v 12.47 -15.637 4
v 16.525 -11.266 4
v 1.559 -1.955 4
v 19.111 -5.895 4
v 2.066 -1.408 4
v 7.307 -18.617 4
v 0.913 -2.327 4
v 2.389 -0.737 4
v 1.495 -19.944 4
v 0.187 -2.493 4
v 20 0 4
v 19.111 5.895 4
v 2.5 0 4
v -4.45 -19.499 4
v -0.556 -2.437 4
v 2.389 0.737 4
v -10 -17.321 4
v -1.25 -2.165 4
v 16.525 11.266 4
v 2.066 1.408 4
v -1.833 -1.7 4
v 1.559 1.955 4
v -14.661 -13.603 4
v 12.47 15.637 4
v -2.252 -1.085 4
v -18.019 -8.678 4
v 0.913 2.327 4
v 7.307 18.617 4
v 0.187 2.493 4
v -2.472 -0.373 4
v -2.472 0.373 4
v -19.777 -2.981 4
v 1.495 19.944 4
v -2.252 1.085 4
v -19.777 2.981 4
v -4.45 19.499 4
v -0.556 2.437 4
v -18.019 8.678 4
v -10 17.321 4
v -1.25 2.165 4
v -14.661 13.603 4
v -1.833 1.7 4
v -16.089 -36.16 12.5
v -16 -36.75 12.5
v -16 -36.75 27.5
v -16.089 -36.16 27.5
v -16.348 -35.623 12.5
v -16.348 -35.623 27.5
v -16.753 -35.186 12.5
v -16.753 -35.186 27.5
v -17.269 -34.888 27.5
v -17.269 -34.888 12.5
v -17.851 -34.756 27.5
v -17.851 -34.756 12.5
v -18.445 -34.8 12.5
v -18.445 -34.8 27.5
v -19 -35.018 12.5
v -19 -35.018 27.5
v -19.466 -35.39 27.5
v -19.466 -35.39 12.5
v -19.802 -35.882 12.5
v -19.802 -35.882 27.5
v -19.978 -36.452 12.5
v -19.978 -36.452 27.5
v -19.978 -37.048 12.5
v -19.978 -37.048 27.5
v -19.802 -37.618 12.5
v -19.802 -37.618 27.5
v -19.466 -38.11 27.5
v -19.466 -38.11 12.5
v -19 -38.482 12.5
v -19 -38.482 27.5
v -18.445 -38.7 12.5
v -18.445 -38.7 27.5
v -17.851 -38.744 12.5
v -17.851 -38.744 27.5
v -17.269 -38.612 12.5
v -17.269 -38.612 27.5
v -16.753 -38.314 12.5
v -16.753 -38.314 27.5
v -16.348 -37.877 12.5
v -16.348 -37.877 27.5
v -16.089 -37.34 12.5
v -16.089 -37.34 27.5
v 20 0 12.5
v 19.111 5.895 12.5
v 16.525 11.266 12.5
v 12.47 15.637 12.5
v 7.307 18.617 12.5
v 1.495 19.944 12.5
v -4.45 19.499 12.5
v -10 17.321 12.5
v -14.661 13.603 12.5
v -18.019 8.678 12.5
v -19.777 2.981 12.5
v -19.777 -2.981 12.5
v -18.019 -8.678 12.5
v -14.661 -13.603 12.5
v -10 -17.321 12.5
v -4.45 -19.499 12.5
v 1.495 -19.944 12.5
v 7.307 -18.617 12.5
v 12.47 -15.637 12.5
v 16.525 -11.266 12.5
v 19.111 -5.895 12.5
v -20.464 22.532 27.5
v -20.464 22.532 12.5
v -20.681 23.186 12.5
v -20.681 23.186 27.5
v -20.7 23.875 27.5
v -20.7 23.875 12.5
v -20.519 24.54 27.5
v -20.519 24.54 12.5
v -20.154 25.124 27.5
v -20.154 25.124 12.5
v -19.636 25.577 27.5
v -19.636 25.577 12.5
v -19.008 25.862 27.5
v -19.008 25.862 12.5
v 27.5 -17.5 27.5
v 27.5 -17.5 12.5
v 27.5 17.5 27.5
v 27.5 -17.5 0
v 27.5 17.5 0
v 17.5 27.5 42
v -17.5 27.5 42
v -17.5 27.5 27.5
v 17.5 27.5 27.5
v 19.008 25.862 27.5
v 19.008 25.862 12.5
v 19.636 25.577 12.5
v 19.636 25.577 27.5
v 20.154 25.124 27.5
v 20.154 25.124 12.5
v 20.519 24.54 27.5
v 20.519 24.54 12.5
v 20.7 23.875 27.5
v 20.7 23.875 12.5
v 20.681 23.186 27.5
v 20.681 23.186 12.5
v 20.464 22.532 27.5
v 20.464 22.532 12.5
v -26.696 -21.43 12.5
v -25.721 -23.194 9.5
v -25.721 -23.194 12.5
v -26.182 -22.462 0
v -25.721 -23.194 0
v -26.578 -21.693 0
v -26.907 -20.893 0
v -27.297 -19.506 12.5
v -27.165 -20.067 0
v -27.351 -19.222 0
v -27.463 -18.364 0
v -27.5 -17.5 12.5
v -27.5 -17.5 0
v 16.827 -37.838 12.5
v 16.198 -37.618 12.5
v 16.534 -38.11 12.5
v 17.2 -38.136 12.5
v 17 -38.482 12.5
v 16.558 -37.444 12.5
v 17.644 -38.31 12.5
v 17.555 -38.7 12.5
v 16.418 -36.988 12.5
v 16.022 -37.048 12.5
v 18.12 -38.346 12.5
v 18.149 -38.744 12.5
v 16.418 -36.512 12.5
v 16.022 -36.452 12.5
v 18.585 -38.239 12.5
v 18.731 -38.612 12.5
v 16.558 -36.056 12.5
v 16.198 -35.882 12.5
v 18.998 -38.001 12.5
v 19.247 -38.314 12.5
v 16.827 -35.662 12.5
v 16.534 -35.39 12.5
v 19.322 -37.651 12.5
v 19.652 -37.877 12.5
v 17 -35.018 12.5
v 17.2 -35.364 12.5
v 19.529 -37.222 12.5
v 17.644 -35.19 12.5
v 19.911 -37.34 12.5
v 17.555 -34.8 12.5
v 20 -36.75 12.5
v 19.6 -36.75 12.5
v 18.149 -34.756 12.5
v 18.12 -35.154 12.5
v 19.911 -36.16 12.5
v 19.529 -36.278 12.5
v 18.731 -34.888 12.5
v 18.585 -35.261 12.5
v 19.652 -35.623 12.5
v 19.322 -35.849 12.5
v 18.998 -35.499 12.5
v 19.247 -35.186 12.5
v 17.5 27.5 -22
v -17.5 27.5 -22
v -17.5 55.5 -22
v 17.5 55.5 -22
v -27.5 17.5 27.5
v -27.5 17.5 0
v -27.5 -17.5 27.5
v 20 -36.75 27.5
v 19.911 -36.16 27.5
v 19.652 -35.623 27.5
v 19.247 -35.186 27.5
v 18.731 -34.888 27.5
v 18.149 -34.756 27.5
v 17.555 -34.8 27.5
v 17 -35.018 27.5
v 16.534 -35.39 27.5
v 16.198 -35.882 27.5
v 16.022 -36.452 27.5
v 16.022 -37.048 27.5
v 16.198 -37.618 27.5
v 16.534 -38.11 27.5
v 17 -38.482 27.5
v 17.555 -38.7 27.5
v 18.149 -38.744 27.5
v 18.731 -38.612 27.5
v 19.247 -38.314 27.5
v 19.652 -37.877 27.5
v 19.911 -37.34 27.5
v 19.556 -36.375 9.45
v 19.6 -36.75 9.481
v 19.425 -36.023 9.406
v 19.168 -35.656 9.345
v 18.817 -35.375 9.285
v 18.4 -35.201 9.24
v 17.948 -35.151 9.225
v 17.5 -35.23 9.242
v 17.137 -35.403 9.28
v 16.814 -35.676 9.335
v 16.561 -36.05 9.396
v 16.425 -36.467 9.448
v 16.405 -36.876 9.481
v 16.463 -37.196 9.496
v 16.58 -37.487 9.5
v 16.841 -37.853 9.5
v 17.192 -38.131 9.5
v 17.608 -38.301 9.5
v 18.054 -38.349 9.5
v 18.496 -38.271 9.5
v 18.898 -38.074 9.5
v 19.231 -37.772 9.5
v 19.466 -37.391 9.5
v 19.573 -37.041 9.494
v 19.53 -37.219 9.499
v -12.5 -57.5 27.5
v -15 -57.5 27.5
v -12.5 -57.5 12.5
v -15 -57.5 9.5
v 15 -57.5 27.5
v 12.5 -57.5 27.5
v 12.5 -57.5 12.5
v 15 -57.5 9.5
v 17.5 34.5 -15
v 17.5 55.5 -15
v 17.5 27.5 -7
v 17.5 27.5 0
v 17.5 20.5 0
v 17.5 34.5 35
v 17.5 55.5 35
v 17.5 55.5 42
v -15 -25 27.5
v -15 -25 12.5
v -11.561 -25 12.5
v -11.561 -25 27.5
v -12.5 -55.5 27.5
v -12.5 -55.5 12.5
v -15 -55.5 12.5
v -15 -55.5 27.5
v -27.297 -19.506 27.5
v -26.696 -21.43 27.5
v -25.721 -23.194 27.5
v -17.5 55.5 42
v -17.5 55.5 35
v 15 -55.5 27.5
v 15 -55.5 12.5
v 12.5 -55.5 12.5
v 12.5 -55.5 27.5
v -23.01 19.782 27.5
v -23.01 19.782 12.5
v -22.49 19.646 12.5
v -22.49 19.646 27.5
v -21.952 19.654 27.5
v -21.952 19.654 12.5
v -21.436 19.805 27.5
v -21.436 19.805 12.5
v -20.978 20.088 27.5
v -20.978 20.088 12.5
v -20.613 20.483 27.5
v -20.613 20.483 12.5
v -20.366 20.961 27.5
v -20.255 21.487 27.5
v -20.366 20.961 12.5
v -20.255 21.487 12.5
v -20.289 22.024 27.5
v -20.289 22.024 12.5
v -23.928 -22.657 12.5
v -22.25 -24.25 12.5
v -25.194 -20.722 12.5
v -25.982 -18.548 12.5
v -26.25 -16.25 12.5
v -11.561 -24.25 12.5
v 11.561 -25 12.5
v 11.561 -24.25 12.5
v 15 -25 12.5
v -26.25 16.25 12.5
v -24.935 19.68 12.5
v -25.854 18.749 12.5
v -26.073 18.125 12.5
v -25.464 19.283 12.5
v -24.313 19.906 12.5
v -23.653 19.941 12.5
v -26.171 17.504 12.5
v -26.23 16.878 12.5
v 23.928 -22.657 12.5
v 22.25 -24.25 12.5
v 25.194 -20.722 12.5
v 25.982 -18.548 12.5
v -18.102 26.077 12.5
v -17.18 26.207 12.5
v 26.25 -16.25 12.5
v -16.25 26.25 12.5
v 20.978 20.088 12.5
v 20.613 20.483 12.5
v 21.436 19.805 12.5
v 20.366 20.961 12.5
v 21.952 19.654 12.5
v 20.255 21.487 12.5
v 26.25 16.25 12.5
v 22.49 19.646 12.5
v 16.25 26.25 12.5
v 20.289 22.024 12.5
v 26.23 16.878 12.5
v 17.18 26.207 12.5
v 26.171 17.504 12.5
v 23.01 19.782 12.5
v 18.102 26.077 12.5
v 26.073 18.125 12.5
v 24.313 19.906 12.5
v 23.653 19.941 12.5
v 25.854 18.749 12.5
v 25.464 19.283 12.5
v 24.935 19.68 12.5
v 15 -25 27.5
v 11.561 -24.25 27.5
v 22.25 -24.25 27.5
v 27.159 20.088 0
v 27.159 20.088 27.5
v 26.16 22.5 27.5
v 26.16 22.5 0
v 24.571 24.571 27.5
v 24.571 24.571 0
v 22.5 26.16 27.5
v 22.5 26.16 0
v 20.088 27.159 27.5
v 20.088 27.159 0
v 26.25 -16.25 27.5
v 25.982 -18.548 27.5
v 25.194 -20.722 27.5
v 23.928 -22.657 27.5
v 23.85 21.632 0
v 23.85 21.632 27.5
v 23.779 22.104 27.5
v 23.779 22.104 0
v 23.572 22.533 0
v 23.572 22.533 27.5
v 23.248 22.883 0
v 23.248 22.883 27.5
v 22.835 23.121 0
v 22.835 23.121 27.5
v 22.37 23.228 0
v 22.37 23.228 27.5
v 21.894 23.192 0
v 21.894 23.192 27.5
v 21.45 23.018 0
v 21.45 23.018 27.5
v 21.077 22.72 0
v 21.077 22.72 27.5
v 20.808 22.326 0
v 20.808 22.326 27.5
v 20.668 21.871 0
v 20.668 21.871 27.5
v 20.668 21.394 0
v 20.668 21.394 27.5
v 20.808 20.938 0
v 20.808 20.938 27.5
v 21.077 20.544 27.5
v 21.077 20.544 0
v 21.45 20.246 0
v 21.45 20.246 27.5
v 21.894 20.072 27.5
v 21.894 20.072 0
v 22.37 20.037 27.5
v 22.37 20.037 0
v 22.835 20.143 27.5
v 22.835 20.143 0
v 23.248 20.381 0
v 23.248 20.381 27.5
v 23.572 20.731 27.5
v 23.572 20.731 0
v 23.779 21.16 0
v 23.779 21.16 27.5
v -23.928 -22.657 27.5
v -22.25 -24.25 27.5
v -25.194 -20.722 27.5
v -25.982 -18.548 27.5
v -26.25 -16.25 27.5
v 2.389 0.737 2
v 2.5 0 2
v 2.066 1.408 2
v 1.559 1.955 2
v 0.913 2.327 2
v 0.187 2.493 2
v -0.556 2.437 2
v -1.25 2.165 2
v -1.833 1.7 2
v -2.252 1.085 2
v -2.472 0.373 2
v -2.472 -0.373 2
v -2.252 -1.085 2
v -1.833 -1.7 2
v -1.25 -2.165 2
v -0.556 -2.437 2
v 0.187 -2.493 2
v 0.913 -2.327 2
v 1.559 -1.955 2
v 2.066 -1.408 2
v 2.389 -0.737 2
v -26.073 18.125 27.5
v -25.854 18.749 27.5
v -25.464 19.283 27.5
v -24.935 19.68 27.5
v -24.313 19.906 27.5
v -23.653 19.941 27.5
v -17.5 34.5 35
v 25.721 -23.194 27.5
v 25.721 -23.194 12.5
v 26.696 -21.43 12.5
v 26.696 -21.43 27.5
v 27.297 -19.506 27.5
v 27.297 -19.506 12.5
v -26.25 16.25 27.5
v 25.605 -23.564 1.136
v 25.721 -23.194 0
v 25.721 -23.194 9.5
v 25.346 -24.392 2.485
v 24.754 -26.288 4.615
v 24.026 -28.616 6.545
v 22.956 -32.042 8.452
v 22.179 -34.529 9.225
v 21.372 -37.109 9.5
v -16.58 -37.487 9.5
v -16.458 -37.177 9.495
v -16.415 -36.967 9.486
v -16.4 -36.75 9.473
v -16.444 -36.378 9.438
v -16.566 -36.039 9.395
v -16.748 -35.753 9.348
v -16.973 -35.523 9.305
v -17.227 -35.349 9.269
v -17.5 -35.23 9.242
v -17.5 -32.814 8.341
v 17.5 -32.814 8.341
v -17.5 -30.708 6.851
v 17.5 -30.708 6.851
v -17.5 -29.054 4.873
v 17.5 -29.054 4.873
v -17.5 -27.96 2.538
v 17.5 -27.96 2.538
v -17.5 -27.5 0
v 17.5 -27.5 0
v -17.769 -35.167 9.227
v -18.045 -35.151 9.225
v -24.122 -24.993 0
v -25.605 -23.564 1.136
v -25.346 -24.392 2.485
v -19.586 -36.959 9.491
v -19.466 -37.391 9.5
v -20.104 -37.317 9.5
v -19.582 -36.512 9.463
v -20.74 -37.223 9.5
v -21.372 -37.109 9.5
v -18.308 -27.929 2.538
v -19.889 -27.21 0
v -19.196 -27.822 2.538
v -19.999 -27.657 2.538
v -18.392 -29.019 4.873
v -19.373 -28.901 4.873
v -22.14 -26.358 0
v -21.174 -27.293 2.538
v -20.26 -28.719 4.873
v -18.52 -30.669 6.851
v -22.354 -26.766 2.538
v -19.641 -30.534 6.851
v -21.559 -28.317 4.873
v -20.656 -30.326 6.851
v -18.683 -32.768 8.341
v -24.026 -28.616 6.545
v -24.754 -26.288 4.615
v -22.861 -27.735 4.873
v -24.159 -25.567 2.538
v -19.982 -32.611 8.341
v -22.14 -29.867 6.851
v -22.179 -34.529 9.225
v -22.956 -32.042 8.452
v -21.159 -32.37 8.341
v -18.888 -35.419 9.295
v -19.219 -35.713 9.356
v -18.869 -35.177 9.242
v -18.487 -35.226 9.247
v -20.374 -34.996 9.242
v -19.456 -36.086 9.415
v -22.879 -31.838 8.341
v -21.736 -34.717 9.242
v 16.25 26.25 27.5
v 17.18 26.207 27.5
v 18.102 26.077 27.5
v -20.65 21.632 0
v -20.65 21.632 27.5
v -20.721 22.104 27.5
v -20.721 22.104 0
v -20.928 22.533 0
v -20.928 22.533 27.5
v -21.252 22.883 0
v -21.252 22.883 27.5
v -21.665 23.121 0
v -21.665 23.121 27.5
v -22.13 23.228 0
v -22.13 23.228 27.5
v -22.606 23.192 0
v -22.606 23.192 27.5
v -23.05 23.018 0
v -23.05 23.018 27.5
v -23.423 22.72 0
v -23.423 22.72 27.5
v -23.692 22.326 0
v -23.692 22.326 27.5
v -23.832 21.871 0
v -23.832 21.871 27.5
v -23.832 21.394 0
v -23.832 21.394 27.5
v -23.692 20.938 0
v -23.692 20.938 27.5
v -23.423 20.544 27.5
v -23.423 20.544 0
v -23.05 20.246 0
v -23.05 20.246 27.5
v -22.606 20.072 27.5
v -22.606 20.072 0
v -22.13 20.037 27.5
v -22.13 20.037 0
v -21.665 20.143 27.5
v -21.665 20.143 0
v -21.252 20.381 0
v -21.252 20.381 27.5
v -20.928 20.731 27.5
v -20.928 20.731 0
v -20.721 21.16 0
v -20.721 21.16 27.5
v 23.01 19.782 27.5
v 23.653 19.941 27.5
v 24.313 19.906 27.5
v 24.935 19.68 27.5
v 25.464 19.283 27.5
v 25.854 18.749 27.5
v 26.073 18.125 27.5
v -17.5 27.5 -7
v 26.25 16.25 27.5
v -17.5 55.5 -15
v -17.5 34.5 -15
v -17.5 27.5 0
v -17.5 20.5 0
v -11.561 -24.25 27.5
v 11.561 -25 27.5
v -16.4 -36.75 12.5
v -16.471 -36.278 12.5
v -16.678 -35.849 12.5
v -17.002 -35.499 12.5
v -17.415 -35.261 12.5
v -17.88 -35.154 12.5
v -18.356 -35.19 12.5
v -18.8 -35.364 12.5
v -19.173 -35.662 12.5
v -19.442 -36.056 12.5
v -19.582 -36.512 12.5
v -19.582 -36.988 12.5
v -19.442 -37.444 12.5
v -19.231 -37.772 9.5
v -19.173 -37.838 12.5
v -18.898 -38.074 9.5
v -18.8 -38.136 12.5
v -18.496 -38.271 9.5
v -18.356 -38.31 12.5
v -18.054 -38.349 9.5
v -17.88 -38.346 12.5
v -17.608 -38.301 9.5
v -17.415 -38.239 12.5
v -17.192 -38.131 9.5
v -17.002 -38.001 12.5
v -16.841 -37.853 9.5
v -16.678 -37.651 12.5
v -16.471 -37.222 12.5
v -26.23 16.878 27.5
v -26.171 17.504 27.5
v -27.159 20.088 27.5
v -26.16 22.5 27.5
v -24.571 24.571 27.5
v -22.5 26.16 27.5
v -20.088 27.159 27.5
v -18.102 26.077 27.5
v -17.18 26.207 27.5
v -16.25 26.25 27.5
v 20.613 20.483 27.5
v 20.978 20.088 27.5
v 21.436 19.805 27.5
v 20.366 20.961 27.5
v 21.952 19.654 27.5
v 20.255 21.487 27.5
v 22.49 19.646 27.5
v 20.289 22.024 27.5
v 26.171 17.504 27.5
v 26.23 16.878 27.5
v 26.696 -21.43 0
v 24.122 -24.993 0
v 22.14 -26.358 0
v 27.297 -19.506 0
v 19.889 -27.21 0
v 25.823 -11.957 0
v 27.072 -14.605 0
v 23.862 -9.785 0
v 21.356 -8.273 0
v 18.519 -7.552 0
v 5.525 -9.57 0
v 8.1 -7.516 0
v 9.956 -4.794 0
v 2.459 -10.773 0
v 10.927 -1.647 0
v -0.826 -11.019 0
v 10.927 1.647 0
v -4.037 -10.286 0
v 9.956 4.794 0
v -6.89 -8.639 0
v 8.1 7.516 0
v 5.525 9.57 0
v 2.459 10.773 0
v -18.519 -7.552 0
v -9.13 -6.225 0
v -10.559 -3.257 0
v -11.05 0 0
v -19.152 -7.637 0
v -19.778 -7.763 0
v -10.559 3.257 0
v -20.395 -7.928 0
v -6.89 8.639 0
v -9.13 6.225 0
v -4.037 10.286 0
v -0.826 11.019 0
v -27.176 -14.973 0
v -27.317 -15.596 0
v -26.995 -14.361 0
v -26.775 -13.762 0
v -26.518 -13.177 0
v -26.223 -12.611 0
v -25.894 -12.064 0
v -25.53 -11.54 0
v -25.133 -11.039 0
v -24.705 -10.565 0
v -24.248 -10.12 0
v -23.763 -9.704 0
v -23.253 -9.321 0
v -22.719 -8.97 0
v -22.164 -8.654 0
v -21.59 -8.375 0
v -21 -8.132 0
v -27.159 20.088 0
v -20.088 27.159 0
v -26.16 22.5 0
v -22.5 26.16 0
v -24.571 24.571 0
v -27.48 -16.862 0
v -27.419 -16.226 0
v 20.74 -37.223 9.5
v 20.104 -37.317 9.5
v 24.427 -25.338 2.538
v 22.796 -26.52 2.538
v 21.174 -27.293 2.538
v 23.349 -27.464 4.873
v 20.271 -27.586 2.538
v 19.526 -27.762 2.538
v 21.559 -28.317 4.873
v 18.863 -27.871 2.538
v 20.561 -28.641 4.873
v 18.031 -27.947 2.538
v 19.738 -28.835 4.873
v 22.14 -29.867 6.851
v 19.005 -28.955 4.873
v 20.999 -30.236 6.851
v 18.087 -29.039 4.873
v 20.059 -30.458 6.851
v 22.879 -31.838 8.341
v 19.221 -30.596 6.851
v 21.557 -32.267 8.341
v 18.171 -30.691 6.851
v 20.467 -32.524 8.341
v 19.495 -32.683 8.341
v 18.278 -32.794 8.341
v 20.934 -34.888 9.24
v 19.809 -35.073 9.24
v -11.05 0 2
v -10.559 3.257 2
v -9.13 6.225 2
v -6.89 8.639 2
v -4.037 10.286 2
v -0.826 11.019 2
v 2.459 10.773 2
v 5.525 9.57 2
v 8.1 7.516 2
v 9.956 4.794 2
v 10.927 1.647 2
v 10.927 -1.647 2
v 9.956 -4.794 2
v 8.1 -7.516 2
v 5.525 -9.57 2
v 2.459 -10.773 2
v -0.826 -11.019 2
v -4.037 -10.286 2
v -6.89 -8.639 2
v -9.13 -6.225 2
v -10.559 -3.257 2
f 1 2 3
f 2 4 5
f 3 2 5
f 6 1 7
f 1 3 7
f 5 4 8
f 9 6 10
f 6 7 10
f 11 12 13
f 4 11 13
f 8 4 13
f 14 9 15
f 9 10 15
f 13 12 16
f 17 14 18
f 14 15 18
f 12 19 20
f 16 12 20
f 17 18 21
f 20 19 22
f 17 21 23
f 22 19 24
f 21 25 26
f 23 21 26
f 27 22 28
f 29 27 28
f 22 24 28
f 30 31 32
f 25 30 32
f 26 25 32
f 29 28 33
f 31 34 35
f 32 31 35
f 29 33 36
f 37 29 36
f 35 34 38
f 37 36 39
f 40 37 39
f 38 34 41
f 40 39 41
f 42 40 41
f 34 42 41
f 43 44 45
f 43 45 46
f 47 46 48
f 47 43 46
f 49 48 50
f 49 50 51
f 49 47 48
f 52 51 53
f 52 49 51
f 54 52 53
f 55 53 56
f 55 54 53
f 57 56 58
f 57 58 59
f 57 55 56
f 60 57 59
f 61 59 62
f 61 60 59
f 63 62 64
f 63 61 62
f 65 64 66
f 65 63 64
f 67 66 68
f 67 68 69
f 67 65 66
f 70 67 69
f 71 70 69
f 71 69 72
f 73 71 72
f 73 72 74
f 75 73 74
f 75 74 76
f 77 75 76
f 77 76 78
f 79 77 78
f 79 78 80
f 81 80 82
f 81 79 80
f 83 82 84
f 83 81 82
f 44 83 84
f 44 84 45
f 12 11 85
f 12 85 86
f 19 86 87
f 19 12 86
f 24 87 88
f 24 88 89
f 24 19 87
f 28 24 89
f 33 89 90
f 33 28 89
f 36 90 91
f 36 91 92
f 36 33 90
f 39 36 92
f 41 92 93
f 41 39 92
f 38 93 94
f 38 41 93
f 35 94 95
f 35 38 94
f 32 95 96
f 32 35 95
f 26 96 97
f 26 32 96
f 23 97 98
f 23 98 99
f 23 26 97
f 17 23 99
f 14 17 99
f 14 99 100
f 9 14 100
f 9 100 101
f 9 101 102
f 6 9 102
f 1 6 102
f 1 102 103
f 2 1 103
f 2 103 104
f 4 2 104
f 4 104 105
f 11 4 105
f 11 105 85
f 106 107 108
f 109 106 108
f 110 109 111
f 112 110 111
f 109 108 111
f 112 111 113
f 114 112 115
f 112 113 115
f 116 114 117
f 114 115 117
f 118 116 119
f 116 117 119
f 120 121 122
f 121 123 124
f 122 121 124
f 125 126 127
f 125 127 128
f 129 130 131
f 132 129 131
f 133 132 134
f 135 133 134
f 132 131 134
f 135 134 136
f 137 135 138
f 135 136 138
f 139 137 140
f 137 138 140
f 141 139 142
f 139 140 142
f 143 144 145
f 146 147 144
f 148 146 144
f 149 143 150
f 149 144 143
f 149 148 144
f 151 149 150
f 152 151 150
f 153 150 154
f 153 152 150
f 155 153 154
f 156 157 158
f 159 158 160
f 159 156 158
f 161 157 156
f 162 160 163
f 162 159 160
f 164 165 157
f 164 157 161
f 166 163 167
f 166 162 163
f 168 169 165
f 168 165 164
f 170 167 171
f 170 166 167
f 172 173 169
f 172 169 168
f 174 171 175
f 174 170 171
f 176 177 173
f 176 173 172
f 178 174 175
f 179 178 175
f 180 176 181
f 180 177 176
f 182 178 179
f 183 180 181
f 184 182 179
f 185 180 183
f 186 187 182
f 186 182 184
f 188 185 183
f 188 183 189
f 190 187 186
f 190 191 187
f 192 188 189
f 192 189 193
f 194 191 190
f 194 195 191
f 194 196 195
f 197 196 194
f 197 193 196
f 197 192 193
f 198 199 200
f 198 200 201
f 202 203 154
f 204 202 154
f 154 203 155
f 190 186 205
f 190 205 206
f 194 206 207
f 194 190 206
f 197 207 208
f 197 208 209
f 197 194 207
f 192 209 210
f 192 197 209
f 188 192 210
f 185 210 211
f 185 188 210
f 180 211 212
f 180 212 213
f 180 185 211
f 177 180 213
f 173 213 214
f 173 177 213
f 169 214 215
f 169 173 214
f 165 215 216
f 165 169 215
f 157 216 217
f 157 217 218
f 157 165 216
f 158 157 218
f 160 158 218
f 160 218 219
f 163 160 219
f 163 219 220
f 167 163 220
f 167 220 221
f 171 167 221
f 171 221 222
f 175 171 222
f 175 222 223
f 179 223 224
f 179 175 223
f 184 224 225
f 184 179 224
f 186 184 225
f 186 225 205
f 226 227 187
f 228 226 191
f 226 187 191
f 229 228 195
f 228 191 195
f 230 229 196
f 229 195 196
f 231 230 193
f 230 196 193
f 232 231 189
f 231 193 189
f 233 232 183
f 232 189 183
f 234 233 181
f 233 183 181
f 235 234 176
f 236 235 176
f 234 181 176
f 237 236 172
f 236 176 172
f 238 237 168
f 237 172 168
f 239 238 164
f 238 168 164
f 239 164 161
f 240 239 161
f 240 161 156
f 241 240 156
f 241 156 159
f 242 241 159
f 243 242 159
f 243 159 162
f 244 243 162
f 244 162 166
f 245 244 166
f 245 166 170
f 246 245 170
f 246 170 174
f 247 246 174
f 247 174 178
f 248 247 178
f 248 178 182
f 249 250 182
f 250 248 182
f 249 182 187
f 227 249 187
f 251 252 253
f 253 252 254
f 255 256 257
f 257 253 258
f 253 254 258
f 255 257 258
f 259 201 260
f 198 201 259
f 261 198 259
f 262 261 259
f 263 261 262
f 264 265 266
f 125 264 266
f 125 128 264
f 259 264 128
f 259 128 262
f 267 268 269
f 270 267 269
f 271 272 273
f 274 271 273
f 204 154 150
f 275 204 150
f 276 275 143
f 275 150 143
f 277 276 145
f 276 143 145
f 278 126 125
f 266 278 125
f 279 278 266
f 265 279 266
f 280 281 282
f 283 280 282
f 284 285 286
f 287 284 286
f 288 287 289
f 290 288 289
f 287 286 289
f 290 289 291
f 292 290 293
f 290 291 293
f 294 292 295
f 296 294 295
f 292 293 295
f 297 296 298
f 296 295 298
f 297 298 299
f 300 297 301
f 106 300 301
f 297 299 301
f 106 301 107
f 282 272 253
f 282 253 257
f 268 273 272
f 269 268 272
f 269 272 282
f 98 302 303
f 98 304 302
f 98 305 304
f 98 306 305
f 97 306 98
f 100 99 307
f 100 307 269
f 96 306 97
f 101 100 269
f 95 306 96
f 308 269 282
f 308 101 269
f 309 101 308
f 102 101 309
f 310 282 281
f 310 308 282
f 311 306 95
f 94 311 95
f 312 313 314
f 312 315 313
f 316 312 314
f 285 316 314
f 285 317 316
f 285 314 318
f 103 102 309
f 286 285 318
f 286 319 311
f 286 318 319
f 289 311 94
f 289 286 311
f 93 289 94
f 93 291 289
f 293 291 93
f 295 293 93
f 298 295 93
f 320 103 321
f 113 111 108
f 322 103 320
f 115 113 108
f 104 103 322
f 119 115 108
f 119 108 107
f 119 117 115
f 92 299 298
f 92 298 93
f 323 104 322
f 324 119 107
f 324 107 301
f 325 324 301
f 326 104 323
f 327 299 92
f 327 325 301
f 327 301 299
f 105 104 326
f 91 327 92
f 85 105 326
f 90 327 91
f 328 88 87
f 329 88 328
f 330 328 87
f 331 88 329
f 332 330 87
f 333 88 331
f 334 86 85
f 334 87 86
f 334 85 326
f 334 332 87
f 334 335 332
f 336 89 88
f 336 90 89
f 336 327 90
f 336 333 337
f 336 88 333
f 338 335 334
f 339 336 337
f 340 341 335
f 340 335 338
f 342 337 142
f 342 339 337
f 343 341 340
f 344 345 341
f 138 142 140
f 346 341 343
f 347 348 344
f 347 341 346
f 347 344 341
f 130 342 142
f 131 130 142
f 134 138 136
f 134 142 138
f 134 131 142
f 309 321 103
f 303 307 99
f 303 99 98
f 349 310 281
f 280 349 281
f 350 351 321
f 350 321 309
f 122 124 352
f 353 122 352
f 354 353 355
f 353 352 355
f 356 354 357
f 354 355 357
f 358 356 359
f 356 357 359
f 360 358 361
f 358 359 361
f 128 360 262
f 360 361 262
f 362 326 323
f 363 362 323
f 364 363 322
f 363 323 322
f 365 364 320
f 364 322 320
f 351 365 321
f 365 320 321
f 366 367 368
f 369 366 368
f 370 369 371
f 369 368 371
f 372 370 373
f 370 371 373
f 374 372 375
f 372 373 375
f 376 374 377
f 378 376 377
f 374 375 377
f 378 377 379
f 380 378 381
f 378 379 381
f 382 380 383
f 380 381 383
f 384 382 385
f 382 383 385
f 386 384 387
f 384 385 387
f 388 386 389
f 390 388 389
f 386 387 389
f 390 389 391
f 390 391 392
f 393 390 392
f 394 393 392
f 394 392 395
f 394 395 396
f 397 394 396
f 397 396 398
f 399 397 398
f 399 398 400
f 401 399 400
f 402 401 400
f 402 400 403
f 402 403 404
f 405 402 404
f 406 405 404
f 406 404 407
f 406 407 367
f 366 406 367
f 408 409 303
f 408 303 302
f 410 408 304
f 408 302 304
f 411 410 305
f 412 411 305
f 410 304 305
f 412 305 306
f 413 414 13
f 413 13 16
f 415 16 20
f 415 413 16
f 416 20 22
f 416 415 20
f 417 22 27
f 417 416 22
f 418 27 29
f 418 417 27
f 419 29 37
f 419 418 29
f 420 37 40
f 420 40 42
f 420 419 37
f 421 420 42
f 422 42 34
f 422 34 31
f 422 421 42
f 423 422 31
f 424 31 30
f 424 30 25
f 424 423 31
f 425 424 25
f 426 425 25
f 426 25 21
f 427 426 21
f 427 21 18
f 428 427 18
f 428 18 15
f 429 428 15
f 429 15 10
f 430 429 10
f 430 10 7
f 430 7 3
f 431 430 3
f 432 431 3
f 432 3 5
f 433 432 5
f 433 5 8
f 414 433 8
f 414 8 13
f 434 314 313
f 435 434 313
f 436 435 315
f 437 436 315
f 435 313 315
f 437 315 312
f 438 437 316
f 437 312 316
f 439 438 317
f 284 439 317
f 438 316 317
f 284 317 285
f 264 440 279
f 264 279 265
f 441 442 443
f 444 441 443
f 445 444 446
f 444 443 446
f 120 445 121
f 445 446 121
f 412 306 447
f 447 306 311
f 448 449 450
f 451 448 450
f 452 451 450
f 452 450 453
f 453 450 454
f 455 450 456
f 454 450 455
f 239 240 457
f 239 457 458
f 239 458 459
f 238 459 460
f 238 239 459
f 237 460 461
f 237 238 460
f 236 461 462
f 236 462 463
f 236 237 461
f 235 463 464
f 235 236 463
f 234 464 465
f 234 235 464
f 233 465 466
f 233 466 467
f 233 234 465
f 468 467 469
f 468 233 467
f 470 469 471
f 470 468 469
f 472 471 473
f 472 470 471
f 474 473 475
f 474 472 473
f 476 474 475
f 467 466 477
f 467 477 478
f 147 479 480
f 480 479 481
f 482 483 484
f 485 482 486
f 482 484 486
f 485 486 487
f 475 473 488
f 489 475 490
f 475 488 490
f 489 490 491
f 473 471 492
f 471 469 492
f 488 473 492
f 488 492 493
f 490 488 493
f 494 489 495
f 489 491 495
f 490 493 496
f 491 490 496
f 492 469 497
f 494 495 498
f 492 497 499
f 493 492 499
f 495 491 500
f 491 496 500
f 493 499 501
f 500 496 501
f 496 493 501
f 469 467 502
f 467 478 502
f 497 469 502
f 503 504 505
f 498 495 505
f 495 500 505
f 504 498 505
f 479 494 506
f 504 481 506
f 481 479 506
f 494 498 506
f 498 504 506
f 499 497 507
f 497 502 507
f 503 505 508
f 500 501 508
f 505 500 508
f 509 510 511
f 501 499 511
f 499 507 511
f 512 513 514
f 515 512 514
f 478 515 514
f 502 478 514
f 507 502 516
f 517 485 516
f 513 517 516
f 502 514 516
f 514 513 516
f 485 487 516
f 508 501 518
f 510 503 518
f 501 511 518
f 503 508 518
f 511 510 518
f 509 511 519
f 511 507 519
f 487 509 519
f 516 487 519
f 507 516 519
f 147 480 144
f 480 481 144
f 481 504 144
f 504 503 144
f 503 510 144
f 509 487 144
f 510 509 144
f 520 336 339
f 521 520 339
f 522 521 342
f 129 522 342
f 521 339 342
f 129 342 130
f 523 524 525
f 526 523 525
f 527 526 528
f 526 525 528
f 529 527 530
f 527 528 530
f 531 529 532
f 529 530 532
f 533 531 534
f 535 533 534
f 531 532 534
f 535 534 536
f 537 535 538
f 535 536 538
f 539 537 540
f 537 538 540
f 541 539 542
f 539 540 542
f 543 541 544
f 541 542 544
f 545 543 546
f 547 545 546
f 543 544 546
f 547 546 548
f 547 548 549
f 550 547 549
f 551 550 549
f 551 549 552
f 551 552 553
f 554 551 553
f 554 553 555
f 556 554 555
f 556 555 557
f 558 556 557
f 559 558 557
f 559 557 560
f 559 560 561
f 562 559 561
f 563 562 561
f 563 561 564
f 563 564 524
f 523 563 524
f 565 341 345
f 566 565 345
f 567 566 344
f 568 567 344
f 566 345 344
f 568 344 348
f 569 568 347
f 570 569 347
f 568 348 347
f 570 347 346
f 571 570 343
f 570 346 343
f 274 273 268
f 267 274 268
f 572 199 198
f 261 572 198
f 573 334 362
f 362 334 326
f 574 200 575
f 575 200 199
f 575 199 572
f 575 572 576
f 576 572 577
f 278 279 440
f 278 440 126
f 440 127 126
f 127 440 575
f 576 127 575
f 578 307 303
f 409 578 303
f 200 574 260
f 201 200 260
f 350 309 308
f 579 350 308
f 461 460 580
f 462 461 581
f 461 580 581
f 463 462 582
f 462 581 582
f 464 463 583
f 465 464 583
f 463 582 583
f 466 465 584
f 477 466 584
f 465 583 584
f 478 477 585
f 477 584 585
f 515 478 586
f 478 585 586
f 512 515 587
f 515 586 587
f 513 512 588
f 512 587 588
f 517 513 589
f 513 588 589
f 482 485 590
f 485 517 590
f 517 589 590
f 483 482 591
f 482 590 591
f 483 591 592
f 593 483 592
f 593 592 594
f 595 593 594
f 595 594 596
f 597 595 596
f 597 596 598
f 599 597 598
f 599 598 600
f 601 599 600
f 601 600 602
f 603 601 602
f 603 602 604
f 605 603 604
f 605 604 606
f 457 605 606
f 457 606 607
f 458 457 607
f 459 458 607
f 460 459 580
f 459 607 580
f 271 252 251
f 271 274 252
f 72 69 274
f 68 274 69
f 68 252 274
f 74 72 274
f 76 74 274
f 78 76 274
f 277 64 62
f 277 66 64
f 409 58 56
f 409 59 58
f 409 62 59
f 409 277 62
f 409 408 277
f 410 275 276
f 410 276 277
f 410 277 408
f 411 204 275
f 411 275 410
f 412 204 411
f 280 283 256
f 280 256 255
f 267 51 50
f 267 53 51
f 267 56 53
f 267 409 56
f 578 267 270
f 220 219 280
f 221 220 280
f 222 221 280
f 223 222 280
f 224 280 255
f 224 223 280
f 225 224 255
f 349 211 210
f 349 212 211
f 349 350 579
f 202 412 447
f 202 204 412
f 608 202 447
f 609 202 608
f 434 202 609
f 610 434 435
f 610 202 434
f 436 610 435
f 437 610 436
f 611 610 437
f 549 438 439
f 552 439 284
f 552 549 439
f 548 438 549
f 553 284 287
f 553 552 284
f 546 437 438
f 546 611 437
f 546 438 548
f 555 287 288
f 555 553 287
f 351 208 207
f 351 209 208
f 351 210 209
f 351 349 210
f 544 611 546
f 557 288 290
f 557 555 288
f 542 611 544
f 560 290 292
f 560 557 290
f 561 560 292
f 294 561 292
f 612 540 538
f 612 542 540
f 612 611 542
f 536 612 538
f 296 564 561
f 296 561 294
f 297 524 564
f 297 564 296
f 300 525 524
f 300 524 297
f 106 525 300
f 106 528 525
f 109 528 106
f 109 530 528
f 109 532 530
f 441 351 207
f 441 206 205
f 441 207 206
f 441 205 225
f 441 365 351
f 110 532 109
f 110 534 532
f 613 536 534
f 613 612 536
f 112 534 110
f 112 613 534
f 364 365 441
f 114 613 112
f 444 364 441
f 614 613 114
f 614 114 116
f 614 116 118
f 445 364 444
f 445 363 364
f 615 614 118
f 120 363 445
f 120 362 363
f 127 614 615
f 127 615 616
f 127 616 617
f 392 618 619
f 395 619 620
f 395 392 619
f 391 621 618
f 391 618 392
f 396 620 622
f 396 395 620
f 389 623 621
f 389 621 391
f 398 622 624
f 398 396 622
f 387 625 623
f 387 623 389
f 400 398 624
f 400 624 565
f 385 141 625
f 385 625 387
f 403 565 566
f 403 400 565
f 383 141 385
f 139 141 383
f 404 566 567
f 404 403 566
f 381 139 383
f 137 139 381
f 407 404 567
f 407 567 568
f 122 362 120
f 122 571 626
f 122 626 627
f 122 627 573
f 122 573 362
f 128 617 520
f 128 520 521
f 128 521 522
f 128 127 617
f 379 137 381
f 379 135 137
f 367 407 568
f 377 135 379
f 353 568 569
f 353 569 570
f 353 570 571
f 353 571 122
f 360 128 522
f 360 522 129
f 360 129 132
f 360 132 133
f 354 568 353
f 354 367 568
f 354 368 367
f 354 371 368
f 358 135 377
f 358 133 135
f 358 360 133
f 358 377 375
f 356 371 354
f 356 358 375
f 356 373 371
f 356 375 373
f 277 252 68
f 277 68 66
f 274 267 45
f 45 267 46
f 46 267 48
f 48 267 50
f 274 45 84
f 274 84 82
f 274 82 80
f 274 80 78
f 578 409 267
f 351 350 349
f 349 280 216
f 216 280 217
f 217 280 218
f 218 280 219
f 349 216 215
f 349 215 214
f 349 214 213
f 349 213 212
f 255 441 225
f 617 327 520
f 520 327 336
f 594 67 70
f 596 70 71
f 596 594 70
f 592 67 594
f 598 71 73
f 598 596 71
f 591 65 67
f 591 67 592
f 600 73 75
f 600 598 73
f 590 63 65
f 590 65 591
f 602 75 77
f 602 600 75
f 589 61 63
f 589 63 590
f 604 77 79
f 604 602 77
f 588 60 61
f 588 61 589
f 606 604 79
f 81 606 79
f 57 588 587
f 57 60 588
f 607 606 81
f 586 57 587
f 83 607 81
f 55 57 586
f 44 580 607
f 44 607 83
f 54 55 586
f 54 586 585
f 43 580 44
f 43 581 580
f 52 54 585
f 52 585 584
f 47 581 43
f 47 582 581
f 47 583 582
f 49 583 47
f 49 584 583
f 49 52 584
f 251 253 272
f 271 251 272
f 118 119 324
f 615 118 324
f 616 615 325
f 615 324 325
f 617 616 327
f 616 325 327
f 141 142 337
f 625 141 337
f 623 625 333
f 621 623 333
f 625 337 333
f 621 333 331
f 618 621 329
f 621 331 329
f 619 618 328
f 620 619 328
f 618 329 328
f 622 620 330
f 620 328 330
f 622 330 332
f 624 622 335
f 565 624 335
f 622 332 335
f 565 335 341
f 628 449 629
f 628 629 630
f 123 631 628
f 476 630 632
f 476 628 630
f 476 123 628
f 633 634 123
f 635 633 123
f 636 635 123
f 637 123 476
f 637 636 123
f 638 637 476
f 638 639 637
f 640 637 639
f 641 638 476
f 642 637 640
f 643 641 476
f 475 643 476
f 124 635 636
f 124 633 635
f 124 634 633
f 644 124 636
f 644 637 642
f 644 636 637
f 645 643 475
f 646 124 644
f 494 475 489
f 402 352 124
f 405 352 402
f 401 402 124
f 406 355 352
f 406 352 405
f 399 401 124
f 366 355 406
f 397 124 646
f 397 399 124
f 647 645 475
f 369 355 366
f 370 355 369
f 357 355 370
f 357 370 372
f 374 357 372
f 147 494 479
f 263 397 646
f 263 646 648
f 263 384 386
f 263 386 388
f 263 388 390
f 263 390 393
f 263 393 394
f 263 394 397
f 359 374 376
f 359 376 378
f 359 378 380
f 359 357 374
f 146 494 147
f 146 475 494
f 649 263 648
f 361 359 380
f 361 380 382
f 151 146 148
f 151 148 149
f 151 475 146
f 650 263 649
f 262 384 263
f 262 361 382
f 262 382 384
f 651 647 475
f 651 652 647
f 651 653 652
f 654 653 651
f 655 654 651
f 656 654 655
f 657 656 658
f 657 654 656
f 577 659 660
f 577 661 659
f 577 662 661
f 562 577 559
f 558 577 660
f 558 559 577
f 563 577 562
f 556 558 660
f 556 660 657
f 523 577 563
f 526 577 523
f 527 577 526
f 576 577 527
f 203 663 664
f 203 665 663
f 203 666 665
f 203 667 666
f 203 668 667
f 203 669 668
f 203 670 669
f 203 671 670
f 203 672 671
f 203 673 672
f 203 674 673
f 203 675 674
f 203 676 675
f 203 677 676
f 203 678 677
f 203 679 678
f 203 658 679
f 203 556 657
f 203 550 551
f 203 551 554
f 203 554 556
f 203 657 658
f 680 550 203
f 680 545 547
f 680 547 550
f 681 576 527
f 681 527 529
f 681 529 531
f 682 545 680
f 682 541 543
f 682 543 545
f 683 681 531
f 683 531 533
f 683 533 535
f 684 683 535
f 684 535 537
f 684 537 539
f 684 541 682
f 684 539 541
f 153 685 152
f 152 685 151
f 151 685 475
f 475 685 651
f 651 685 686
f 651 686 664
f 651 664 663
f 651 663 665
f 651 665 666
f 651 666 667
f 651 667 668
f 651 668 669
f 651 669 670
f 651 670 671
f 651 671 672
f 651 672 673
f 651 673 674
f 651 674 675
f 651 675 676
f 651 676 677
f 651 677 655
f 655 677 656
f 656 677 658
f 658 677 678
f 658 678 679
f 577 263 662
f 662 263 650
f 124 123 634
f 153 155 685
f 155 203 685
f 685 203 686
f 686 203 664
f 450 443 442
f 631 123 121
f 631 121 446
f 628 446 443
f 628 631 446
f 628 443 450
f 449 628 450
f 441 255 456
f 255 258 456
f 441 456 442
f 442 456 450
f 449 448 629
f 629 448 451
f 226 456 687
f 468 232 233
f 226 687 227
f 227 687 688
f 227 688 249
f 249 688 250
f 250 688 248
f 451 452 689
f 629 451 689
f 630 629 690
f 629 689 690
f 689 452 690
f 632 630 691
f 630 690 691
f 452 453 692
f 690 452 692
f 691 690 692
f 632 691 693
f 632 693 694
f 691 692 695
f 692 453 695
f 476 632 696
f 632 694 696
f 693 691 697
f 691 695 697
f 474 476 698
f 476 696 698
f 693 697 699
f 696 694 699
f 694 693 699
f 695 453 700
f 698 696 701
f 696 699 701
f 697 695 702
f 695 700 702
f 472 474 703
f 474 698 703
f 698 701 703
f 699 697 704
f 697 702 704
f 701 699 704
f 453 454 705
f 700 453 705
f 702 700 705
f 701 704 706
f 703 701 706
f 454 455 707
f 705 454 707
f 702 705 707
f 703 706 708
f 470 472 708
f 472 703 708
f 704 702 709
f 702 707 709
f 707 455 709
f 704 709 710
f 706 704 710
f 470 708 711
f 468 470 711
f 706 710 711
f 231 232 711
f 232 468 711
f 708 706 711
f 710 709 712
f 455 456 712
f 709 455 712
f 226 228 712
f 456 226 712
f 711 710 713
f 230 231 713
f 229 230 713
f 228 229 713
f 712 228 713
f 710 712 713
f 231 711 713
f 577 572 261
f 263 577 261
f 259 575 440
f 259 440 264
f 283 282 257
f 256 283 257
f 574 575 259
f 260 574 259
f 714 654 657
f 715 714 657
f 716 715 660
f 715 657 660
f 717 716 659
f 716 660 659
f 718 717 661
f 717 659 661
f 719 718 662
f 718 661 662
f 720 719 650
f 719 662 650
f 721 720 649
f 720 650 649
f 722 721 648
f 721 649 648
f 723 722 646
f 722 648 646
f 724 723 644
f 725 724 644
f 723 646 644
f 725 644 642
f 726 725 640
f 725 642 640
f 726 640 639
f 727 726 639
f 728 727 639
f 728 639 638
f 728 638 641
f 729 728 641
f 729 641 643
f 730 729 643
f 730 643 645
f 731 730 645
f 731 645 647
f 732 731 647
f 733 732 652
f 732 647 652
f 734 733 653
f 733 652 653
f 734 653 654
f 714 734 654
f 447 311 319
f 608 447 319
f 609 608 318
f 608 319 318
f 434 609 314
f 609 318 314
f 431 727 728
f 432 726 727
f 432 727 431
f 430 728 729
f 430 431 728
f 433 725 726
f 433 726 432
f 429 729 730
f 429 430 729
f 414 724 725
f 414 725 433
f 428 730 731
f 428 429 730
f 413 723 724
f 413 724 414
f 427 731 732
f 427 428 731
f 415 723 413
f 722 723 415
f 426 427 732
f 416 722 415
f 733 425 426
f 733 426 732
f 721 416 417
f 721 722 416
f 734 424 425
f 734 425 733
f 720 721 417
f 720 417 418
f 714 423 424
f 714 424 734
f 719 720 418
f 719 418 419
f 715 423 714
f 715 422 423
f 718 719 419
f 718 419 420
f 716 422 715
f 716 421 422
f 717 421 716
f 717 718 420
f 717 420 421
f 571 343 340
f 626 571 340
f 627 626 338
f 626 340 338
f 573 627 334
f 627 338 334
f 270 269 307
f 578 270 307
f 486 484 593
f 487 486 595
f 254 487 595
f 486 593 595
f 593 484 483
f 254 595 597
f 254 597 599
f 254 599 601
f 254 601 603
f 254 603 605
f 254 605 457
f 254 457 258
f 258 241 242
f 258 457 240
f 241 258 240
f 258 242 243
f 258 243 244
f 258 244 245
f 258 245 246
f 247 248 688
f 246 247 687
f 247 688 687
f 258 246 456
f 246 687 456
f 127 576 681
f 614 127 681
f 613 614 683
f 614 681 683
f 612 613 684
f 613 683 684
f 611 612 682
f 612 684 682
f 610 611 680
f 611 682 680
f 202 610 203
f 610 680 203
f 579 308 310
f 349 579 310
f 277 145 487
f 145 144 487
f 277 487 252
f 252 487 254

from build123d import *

# Parameters (mm, degrees)
CROQUIS4_R                  = 2.5
SALIENTE_EXTRUIR1_DEPTH     = 4
CROQUIS5_R                  = 20
SALIENTE_EXTRUIR2_DEPTH     = 8.5
SALIENTE_EXTRUIR4_START     = -3
SALIENTE_EXTRUIR4_DEPTH     = 3
REDONDEO1_R                 = 10
SALIENTE_EXTRUIR5_OUTLINE_R = 2
SALIENTE_EXTRUIR5_DEPTH     = 15
CROQUIS9_R                  = 1.6
CORTAR_EXTRUIR1_DEPTH       = 70.417217007
CROQUIS11_W                 = 35
CROQUIS11_H                 = 50
SALIENTE_EXTRUIR7_DEPTH     = 7
CROQUIS12_W                 = 35
CROQUIS12_H                 = 7
SALIENTE_EXTRUIR8_DEPTH     = 28
CHAFL_N2_SIZE               = 7
CROQUIS13_R                 = 11.05
CORTAR_EXTRUIR2_DEPTH       = 2


# Read off the part's stored shape, not the designer's step: Saliente-Extruir5
with BuildPart() as part:
    # Croquis4 → Saliente-Extruir1 (new body)
    with BuildSketch(Plane.XY):
        with BuildLine():
            Line((-17.5, 27.5), (17.5, 27.5))
            ThreePointArc((17.5, 27.5), (24.571067812, 24.571067812), (27.5, 17.5))
            Line((27.5, 17.5), (27.5, -17.5))
            ThreePointArc((27.5, -17.5), (24.571067812, -24.571067812), (17.5, -27.5))
            Line((17.5, -27.5), (-17.5, -27.5))
            ThreePointArc((-17.5, -27.5), (-24.571067812, -24.571067812), (-27.5, -17.5))
            Line((-27.5, -17.5), (-27.5, 17.5))
            ThreePointArc((-27.5, 17.5), (-24.571067812, 24.571067812), (-17.5, 27.5))
        make_face()
        Circle(CROQUIS4_R, mode=Mode.SUBTRACT)
    extrude(amount=SALIENTE_EXTRUIR1_DEPTH)

    # Croquis5 → Saliente-Extruir2 (add)
    with BuildSketch(Plane.XY.offset(4)):
        with BuildLine():
            Line((-17.5, 27.5), (17.5, 27.5))
            ThreePointArc((17.5, 27.5), (24.571067812, 24.571067812), (27.5, 17.5))
            Line((27.5, 17.5), (27.5, -17.5))
            ThreePointArc((27.5, -17.5), (24.571067812, -24.571067812), (17.5, -27.5))
            Line((17.5, -27.5), (-17.5, -27.5))
            ThreePointArc((-17.5, -27.5), (-24.571067812, -24.571067812), (-27.5, -17.5))
            Line((-27.5, -17.5), (-27.5, 17.5))
            ThreePointArc((-27.5, 17.5), (-24.571067812, 24.571067812), (-17.5, 27.5))
        make_face()
        Circle(CROQUIS5_R, mode=Mode.SUBTRACT)
    extrude(amount=SALIENTE_EXTRUIR2_DEPTH)

    # Croquis6 → Saliente-Extruir4 (add)
    with BuildSketch(Plane.XY.offset(12.5).offset(SALIENTE_EXTRUIR4_START)):
        with BuildLine():
            Line((-25.720640569, -23.193950178), (-15, -57.5))
            Line((-15, -57.5), (15, -57.5))
            Line((15, -57.5), (25.720640569, -23.193950178))
            ThreePointArc((25.720640569, -23.193950178), (22.140069947, -26.358315353), (17.5, -27.5))
            Line((17.5, -27.5), (-17.5, -27.5))
            ThreePointArc((-17.5, -27.5), (-22.140069947, -26.358315353), (-25.720640569, -23.193950178))
        make_face()
    extrude(amount=SALIENTE_EXTRUIR4_DEPTH)

    # Redondeo1
    # the kernel refuses this fillet: 10 mm, written as the material it adds along each edge
    with BuildSketch(Plane(origin=(17.5, -17.5, 9.5), x_dir=(-0.31521717271258337, 0.949019564617656, 0), z_dir=(-0.949019564617656, -0.31521717271258337, 0))) as redondeo1_piece_1_section:
        with BuildLine():
            CenterArc((19.987492178, 10), REDONDEO1_R, 182.865983983, 87.134016017)
            Line((19.987492178, 0), (10, 0))
            Line((10, 0), (10, 9.5))
        make_face()
    redondeo1_piece_1 = revolve(axis=Axis((17.5, -17.5, 9.5), (0, 0, -1)), revolution_arc=198.373924806, mode=Mode.PRIVATE)
    redondeo1_piece_1 = split(redondeo1_piece_1, bisect_by=Plane(origin=(27.5, -26.624186886, 2.060383814), z_dir=(-1, 0, 0)), keep=Keep.TOP, mode=Mode.PRIVATE)
    redondeo1_piece_1 = redondeo1_piece_1 - Plane(origin=(0, 0, 2.060383814), x_dir=(1, 0, 0), z_dir=(0, 0, -1)) * Cylinder(20, 80, mode=Mode.PRIVATE)
    redondeo1_piece_1 = split(redondeo1_piece_1, bisect_by=Plane(origin=(24.437894836, -27.298736526, 2.060383814), z_dir=(-0.9544799780350299, 0.2982749931359464, 0)), keep=Keep.TOP, mode=Mode.PRIVATE)
    add(redondeo1_piece_1)
    with BuildSketch(Plane(origin=(-17.5, -17.5, 9.5), x_dir=(0, -1, 0), z_dir=(1, 0, 0))) as redondeo1_piece_2_section:
        with BuildLine():
            CenterArc((19.987492178, 10), REDONDEO1_R, 182.865983983, 87.134016017)
            Line((19.987492178, 0), (10, 0))
            Line((10, 0), (10, 9.5))
        make_face()
    redondeo1_piece_2 = revolve(axis=Axis((-17.5, -17.5, 9.5), (0, 0, -1)), revolution_arc=198.373924806, mode=Mode.PRIVATE)
    redondeo1_piece_2 = split(redondeo1_piece_2, bisect_by=Plane(origin=(-27.5, -26.624186886, 2.060383814), z_dir=(1, 0, 0)), keep=Keep.TOP, mode=Mode.PRIVATE)
    redondeo1_piece_2 = redondeo1_piece_2 - Plane(origin=(0, 0, 2.060383814), x_dir=(1, 0, 0), z_dir=(0, 0, -1)) * Cylinder(20, 80, mode=Mode.PRIVATE)
    redondeo1_piece_2 = split(redondeo1_piece_2, bisect_by=Plane(origin=(-24.437894836, -27.298736526, 2.060383814), z_dir=(0.9544799780350299, 0.29827499313594635, 0)), keep=Keep.TOP, mode=Mode.PRIVATE)
    add(redondeo1_piece_2)
    with BuildSketch(Plane(origin=(17.5, -27.5, 9.5), x_dir=(0, 0, -1), z_dir=(-1, 0, 0))) as redondeo1_piece_3:
        with BuildLine():
            CenterArc((10, 9.987492178), REDONDEO1_R, 180, 87.134016017)
            Line((0, 9.987492178), (0, 0))
            Line((0, 0), (9.5, 0))
        make_face()
    extrude(amount=35)

    # Saliente-Extruir5 outline → Saliente-Extruir5 (add)
    with BuildSketch(Plane.XY.offset(12.5)):
        with BuildLine():
            ThreePointArc((-27.5, -17.5), (-27.04479978, -20.482749931), (-25.720640569, -23.193950178))
            Line((-25.720640569, -23.193950178), (-15, -57.5))
            Line((-15, -57.5), (-12.5, -57.5))
            Line((-12.5, -57.5), (-12.5, -55.5))
            Line((-12.5, -55.5), (-15, -55.5))
            Line((-15, -55.5), (-15, -25))
            Line((-15, -25), (-11.560632513, -25))
            Line((-11.560632513, -25), (-11.560632513, -24.25))
            Line((-11.560632513, -24.25), (-22.25, -24.25))
            ThreePointArc((-22.25, -24.25), (-25.19427191, -20.722135955), (-26.25, -16.25))
            Line((-26.25, -16.25), (-26.25, 16.25))
            ThreePointArc((-26.25, 16.25), (-26.205571214, 17.191595354), (-26.072679638, 18.12482392))
            ThreePointArc((-26.072679638, 18.12482392), (-24.934779512, 19.680078923), (-23.010409798, 19.782235789))
            ThreePointArc((-23.010409798, 19.782235789), (-20.782444846, 20.273260806), (-20.464111601, 22.532375088))
            ThreePointArc((-20.464111601, 22.532375088), (-20.519074057, 24.539569231), (-19.008189542, 25.862096049))
            ThreePointArc((-19.008189542, 25.862096049), (-17.64266642, 26.152549179), (-16.25, 26.25))
            Line((-16.25, 26.25), (16.25, 26.25))
            ThreePointArc((16.25, 26.25), (17.64266642, 26.152549179), (19.008189542, 25.862096049))
            ThreePointArc((19.008189542, 25.862096049), (20.519074057, 24.539569231), (20.464111601, 22.532375088))
            ThreePointArc((20.464111601, 22.532375088), (20.782444846, 20.273260806), (23.010409798, 19.782235789))
            ThreePointArc((23.010409798, 19.782235789), (24.934779512, 19.680078923), (26.072679638, 18.12482392))
            ThreePointArc((26.072679638, 18.12482392), (26.205571214, 17.191595354), (26.25, 16.25))
            Line((26.25, 16.25), (26.25, -16.25))
            ThreePointArc((26.25, -16.25), (25.19427191, -20.722135955), (22.25, -24.25))
            Line((22.25, -24.25), (11.560632513, -24.25))
            Line((11.560632513, -24.25), (11.560632513, -25))
            Line((11.560632513, -25), (15, -25))
            Line((15, -25), (15, -55.5))
            Line((15, -55.5), (12.5, -55.5))
            Line((12.5, -55.5), (12.5, -57.5))
            Line((12.5, -57.5), (15, -57.5))
            Line((15, -57.5), (25.720640569, -23.193950178))
            ThreePointArc((25.720640569, -23.193950178), (27.04479978, -20.482749931), (27.5, -17.5))
            Line((27.5, -17.5), (27.5, 17.5))
            ThreePointArc((27.5, 17.5), (24.571067812, 24.571067812), (17.5, 27.5))
            Line((17.5, 27.5), (-17.5, 27.5))
            ThreePointArc((-17.5, 27.5), (-24.571067812, 24.571067812), (-27.5, 17.5))
            Line((-27.5, 17.5), (-27.5, -17.5))
        make_face()
        with Locations((-18, -36.75)):
            Circle(SALIENTE_EXTRUIR5_OUTLINE_R, mode=Mode.SUBTRACT)
        with Locations((18, -36.75)):
            Circle(SALIENTE_EXTRUIR5_OUTLINE_R, mode=Mode.SUBTRACT)
    extrude(amount=SALIENTE_EXTRUIR5_DEPTH)

    # Croquis9 → Cortar-Extruir1 (cut, through all)
    with BuildSketch(Plane.XY.offset(27.5)):
        with Locations((-22.25, 21.632040357)):
            Circle(CROQUIS9_R)
        with Locations((-18, -36.75)):
            Circle(CROQUIS9_R)
        with Locations((18, -36.75)):
            Circle(CROQUIS9_R)
        with Locations((22.25, 21.632040357)):
            Circle(CROQUIS9_R)
    extrude(amount=-CORTAR_EXTRUIR1_DEPTH, mode=Mode.SUBTRACT)

    # Croquis11 → Saliente-Extruir7 (add)
    with BuildSketch(Plane(origin=(0, 27.5, 0), x_dir=(1, 0, 0), z_dir=(0, 1, 0))):
        with Locations((0, -10)):
            Rectangle(CROQUIS11_W, CROQUIS11_H)
    extrude(amount=SALIENTE_EXTRUIR7_DEPTH)

    # Croquis12 → Saliente-Extruir8 (add)
    with BuildSketch(Plane.XZ.offset(-27.5)):
        with Locations((0, 38.5)):
            Rectangle(CROQUIS12_W, CROQUIS12_H)
        with Locations((0, -18.5)):
            Rectangle(CROQUIS12_W, CROQUIS12_H)
    extrude(amount=-SALIENTE_EXTRUIR8_DEPTH)

    # Chaflán2
    chafl_n2_edges = [part.edges().sort_by_distance(p)[0] for p in [
        (0, 27.5, 0),
    ]]
    chamfer(chafl_n2_edges, length=CHAFL_N2_SIZE)

    # Croquis13 → Cortar-Extruir2 (cut)
    with BuildSketch(Plane(origin=(0, 0, 0), x_dir=(-1, 0, 0), z_dir=(0, 0, -1))):
        Circle(CROQUIS13_R)
    extrude(amount=-CORTAR_EXTRUIR2_DEPTH, mode=Mode.SUBTRACT)


solid = part.part
